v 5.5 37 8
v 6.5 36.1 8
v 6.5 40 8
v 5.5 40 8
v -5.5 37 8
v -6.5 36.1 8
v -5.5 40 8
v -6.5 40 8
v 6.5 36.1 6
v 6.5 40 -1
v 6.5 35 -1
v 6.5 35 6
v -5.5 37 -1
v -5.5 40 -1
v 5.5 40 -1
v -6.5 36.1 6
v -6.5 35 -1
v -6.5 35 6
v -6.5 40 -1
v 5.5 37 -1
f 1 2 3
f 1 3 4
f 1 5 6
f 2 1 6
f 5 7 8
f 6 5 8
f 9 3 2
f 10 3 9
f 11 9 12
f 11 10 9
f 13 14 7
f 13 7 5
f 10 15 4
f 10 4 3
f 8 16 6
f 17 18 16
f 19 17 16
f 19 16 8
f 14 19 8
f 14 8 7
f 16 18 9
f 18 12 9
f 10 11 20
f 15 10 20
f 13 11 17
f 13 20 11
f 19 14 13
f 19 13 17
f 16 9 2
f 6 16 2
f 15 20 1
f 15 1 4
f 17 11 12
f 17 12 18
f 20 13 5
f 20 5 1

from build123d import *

# Parameters (mm, degrees)
SKETCH050_W      = 2
SKETCH050_H      = 3
EXTRUDE047_DEPTH = 7
EXTRUDE046_DEPTH = 9


with BuildPart() as extrude047:
    # Sketch050 → Extrude047 (new body, symmetric)
    with BuildSketch(Plane.YZ):
        with Locations((35.1, 7.5)):
            Rectangle(SKETCH050_W, SKETCH050_H)
    extrude(amount=EXTRUDE047_DEPTH, both=True)


with BuildPart() as cut040:
    # Sketch049 → Extrude046 (new body)
    with BuildSketch(Plane.XY.offset(-1)):
        Polygon((-5.5, 40), (-5.5, 37), (5.5, 37), (5.5, 40), (6.5, 40), (6.5, 35), (-6.5, 35), (-6.5, 40), align=None)
    extrude(amount=EXTRUDE046_DEPTH)

    # Cut040: cut Extrude047
    add(extrude047.part, mode=Mode.SUBTRACT)


solid = cut040.part
